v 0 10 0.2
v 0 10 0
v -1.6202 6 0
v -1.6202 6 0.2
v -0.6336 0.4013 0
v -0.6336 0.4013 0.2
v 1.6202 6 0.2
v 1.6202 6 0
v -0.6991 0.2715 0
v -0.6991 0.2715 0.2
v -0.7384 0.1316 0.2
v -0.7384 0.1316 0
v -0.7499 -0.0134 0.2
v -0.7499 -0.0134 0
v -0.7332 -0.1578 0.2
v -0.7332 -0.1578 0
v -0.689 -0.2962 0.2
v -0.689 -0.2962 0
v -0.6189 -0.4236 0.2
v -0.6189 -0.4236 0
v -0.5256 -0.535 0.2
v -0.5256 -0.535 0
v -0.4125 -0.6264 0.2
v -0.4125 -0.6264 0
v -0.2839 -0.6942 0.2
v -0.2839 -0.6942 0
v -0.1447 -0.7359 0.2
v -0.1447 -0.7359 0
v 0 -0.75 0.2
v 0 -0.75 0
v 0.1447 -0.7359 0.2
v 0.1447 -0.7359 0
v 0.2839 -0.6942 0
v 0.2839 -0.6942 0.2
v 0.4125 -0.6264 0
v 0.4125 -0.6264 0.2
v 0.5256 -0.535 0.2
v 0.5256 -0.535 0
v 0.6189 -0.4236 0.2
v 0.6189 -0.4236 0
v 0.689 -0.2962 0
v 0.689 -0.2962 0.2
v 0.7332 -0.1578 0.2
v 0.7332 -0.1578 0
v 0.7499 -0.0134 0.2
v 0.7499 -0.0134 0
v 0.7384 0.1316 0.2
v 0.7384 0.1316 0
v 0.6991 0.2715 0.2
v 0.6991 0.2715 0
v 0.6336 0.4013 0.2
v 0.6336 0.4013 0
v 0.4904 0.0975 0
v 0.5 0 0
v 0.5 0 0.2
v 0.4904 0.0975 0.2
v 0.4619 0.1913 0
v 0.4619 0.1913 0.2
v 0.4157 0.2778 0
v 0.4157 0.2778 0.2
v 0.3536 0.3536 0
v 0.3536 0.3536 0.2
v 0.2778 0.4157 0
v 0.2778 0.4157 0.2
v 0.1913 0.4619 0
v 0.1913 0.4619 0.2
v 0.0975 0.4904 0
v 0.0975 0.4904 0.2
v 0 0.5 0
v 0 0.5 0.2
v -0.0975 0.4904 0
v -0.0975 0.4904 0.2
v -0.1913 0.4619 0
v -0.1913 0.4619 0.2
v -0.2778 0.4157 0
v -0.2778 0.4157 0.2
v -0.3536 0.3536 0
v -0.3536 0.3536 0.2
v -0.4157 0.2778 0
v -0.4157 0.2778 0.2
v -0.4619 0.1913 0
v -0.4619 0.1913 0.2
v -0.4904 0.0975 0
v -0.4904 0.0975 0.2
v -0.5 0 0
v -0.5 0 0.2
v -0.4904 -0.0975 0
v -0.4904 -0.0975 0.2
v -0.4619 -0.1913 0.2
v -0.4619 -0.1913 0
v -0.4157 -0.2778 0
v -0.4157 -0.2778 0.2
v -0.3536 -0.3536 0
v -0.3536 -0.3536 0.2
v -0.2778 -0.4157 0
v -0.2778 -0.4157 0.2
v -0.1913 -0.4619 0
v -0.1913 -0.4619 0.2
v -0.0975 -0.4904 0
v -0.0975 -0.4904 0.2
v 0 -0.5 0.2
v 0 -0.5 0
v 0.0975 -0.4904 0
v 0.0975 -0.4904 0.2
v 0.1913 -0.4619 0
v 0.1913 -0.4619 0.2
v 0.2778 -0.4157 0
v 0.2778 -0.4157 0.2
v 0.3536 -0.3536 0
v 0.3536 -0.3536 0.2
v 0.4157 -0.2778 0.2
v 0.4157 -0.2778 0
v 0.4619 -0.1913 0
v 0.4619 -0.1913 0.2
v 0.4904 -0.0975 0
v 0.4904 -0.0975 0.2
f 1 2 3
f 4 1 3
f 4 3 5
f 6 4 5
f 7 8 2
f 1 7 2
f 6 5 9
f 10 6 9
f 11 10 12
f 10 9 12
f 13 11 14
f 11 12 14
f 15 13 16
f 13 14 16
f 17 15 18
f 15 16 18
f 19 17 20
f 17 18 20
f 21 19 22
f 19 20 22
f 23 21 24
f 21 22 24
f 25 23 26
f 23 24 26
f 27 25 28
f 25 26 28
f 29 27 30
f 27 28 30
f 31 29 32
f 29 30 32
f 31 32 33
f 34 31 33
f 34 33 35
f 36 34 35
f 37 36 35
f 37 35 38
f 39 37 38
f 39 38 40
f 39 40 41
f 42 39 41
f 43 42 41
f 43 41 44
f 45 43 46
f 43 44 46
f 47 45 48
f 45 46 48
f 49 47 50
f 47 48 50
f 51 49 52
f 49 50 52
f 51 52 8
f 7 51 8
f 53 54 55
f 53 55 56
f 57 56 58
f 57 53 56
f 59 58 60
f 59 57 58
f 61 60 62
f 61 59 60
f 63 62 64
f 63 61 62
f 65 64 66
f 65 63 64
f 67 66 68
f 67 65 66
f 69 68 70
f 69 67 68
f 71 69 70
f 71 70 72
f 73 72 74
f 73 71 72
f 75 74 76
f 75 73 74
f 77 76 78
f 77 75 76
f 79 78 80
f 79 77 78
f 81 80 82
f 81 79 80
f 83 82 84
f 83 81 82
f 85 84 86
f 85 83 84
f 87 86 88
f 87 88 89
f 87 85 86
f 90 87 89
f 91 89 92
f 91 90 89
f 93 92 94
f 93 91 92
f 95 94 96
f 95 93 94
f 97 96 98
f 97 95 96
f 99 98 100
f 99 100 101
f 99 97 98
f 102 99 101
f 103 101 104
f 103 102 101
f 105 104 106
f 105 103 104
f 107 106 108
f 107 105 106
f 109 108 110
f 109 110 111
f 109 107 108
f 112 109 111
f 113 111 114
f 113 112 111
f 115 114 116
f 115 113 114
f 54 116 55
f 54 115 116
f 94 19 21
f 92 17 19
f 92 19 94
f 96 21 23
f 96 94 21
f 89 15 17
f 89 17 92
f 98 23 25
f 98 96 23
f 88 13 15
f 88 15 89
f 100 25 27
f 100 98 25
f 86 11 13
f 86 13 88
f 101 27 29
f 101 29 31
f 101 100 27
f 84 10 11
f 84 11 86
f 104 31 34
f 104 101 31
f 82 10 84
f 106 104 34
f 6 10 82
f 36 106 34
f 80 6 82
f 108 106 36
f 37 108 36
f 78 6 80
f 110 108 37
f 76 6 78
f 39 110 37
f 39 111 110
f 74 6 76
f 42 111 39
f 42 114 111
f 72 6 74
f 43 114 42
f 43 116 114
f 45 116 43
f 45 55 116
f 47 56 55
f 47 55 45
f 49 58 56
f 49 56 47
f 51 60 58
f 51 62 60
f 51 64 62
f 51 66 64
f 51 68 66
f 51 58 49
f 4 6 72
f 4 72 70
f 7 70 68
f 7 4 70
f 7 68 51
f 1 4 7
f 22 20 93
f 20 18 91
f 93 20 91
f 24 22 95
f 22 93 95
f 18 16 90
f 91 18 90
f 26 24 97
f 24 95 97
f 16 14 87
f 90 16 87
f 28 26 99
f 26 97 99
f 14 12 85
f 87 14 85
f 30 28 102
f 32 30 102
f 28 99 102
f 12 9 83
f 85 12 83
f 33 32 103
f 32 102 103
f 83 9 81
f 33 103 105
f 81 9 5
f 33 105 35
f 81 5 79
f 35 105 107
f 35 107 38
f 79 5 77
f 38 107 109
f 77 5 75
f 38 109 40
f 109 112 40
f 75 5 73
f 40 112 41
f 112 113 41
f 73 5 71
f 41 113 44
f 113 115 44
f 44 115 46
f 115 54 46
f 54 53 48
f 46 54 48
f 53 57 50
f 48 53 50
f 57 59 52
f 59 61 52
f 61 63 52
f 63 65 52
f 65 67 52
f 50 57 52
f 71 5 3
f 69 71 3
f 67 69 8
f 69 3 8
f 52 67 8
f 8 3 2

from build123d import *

# Parameters (mm, degrees)
CROQUIS1_R              = 0.5
SALIENTE_EXTRUIR2_DEPTH = 0.2


with BuildPart() as part:
    # Croquis1 → Saliente-Extruir2 (new body)
    with BuildSketch(Plane.XY):
        with BuildLine():
            Line((-1.620168748, 6), (-0.633616905, 0.401284958))
            ThreePointArc((-0.633616905, 0.401284958), (0, -0.75), (0.633616905, 0.401284958))
            Line((0.633616905, 0.401284958), (1.620168748, 6))
            Line((1.620168748, 6), (0, 10))
            Line((0, 10), (-1.620168748, 6))
        make_face()
        Circle(CROQUIS1_R, mode=Mode.SUBTRACT)
    extrude(amount=SALIENTE_EXTRUIR2_DEPTH)


solid = part.part
